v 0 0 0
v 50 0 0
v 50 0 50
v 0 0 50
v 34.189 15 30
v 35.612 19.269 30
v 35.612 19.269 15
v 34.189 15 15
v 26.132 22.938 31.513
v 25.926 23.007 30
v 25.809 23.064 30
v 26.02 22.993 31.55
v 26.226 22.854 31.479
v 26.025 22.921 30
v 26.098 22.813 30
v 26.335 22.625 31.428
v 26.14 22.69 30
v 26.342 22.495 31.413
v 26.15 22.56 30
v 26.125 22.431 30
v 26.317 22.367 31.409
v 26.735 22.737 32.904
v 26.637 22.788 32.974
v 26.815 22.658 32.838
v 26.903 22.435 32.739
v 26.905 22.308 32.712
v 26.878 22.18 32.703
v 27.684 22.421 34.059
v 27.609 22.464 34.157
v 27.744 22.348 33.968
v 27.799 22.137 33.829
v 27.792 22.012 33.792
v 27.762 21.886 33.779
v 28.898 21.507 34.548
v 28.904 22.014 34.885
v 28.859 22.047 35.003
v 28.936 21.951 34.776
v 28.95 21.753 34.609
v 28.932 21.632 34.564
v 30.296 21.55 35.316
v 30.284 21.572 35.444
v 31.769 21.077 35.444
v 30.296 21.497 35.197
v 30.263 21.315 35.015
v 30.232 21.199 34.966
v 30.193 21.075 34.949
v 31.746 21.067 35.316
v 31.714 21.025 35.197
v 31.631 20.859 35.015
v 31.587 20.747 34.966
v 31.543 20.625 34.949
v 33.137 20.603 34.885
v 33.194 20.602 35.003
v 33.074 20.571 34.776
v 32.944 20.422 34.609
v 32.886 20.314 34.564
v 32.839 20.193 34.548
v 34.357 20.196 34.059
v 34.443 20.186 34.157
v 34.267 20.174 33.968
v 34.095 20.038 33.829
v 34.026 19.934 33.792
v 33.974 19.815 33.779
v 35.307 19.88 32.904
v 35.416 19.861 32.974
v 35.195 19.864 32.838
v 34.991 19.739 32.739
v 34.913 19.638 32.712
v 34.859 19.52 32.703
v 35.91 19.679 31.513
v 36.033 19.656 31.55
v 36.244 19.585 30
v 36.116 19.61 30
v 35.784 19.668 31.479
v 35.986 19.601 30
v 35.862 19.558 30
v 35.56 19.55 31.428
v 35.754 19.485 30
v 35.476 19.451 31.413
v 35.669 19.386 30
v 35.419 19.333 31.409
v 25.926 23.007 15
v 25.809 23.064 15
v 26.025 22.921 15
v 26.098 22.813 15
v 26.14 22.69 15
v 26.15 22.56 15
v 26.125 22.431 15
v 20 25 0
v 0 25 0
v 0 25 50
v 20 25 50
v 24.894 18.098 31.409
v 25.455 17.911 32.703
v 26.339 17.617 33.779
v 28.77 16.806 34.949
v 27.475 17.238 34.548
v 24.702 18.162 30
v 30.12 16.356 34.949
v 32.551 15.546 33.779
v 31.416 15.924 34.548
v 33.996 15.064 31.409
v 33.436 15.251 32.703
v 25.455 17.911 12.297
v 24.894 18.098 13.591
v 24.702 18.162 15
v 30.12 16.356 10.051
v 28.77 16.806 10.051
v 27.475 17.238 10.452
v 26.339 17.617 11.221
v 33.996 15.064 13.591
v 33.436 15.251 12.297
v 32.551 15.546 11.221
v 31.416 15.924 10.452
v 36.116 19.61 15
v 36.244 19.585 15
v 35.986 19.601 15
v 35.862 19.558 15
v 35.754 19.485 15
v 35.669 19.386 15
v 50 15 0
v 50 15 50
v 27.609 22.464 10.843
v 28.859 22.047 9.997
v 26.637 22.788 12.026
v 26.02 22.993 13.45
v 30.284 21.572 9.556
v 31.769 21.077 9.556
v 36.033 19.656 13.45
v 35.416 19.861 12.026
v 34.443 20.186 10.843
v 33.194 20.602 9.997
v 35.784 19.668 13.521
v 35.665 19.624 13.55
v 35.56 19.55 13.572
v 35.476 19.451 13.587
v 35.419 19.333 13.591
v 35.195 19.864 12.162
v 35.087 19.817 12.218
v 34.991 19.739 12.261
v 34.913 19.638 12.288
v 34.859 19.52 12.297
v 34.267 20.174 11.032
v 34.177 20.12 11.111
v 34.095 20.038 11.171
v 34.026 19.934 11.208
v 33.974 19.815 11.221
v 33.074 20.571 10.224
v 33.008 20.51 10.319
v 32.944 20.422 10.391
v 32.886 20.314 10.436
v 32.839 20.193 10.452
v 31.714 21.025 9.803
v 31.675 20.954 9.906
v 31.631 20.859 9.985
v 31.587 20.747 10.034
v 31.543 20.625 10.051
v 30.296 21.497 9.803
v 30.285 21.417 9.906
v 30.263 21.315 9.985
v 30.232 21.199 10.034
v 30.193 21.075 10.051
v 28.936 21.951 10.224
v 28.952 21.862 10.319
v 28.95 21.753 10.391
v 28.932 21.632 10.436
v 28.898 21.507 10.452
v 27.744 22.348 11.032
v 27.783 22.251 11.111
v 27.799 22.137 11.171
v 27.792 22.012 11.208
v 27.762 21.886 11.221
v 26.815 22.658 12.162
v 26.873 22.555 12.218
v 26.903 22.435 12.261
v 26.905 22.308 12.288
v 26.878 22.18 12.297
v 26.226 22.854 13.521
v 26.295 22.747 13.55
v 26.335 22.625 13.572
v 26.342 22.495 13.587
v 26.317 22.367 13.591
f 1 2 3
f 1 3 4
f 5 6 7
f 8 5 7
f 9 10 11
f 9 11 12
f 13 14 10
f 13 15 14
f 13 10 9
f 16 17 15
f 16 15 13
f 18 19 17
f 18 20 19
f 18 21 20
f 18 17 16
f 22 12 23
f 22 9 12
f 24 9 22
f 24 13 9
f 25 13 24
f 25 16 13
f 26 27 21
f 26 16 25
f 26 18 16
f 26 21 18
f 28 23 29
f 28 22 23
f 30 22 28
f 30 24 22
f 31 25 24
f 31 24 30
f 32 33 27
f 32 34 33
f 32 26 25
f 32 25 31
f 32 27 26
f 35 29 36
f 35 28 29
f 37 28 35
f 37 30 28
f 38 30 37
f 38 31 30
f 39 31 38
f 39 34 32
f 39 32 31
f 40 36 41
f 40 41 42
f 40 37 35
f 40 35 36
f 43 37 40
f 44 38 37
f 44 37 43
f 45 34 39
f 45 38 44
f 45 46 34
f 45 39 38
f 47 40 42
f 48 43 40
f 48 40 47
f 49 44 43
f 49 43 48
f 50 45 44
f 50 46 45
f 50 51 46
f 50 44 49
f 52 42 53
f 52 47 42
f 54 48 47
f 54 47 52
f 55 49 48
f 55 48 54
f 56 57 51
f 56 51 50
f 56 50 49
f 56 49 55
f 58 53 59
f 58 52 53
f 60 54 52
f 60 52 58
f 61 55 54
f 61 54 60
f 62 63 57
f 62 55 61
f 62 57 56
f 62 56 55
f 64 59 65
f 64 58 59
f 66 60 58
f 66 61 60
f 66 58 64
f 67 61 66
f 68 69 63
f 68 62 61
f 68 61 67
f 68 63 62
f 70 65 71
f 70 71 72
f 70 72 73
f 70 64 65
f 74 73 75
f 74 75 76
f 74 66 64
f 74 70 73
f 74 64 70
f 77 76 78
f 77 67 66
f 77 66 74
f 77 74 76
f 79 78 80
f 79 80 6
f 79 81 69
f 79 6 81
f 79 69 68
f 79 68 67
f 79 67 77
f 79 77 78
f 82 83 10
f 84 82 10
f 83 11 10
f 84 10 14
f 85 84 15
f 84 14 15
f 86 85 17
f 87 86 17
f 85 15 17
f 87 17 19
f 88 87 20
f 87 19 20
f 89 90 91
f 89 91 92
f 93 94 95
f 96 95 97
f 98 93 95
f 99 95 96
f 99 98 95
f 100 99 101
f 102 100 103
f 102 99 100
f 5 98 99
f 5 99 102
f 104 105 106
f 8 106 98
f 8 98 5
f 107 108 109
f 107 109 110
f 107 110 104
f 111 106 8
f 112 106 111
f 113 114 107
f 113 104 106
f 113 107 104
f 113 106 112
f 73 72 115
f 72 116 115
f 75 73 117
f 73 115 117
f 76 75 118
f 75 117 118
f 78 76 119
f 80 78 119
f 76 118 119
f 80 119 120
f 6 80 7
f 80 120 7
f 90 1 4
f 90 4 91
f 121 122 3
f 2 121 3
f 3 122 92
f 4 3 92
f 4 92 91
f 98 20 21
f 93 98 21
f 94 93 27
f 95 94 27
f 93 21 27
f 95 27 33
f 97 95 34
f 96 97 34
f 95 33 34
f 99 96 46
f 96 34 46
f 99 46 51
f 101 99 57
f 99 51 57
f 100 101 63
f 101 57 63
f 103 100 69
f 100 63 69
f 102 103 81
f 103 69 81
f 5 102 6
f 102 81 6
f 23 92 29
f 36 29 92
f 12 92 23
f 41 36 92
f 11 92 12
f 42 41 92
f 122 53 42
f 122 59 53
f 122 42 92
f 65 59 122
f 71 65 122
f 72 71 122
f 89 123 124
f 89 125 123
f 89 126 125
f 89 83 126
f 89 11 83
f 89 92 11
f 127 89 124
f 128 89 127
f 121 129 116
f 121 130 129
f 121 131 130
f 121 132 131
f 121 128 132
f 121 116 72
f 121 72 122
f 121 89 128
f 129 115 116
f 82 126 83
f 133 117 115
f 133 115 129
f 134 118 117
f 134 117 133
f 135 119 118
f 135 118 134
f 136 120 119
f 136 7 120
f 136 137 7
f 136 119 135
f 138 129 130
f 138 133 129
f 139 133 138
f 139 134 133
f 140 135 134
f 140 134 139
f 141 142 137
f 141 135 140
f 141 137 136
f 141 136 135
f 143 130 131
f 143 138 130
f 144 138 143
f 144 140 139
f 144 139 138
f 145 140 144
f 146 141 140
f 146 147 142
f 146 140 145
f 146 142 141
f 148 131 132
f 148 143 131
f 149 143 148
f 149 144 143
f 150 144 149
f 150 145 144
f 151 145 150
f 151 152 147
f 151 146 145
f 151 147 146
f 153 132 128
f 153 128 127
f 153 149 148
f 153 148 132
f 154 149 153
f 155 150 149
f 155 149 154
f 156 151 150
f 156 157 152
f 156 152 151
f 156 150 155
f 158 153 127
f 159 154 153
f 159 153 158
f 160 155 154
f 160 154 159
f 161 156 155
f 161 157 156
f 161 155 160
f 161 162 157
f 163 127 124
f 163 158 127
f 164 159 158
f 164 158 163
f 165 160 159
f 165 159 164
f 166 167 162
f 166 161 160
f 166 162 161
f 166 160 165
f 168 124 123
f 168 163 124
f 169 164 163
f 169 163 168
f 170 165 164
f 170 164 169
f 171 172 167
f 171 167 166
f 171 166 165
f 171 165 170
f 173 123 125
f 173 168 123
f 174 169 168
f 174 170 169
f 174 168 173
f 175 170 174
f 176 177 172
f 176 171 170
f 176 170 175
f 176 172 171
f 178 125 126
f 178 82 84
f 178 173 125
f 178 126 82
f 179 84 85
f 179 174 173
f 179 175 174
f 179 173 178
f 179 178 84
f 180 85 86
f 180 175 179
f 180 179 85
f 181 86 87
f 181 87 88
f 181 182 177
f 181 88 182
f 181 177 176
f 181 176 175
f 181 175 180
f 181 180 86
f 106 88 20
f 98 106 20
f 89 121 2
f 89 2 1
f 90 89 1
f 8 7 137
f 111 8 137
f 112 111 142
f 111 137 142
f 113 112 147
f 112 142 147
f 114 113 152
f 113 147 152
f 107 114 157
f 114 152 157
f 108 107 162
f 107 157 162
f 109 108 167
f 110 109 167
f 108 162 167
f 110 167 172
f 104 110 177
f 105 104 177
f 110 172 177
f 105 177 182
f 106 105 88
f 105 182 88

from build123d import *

# Parameters (mm, degrees)
BOSS_EXTRUDE2_DEPTH = 50
CUT_EXTRUDE2_DEPTH  = 5
FILLET1_R           = 0.5


with BuildPart() as part:
    # Sketch1 → Boss-Extrude2 (new body)
    with BuildSketch(Plane.XY):
        Polygon((0, 0), (0, 25), (20, 25), (50, 15), (50, 0), align=None)
    extrude(amount=BOSS_EXTRUDE2_DEPTH)

    # Sketch3 → Cut-Extrude2 (cut)
    with BuildSketch(Plane(origin=(9.5, 28.5, 0), x_dir=(0.948683298, -0.316227766, 0), z_dir=(0.316227766, 0.948683298, 0))):
        with BuildLine():
            Line((17.690748412, -15), (17.690748412, -30))
            ThreePointArc((17.690748412, -30), (22.690748412, -35), (27.690748412, -30))
            Line((27.690748412, -30), (27.690748412, -15))
            ThreePointArc((27.690748412, -15), (22.690748412, -10), (17.690748412, -15))
        make_face()
    extrude(amount=-CUT_EXTRUDE2_DEPTH, mode=Mode.SUBTRACT)

    # Fillet1
    fillet1_edges = [part.edges().sort_by_distance(p)[0] for p in [
        (31.026334039, 21.32455532, 10),
        (26.282917549, 22.90569415, 22.5),
        (31.026334039, 21.32455532, 35),
        (35.769750529, 19.74341649, 22.5),
    ]]
    fillet(fillet1_edges, radius=FILLET1_R)


solid = part.part
